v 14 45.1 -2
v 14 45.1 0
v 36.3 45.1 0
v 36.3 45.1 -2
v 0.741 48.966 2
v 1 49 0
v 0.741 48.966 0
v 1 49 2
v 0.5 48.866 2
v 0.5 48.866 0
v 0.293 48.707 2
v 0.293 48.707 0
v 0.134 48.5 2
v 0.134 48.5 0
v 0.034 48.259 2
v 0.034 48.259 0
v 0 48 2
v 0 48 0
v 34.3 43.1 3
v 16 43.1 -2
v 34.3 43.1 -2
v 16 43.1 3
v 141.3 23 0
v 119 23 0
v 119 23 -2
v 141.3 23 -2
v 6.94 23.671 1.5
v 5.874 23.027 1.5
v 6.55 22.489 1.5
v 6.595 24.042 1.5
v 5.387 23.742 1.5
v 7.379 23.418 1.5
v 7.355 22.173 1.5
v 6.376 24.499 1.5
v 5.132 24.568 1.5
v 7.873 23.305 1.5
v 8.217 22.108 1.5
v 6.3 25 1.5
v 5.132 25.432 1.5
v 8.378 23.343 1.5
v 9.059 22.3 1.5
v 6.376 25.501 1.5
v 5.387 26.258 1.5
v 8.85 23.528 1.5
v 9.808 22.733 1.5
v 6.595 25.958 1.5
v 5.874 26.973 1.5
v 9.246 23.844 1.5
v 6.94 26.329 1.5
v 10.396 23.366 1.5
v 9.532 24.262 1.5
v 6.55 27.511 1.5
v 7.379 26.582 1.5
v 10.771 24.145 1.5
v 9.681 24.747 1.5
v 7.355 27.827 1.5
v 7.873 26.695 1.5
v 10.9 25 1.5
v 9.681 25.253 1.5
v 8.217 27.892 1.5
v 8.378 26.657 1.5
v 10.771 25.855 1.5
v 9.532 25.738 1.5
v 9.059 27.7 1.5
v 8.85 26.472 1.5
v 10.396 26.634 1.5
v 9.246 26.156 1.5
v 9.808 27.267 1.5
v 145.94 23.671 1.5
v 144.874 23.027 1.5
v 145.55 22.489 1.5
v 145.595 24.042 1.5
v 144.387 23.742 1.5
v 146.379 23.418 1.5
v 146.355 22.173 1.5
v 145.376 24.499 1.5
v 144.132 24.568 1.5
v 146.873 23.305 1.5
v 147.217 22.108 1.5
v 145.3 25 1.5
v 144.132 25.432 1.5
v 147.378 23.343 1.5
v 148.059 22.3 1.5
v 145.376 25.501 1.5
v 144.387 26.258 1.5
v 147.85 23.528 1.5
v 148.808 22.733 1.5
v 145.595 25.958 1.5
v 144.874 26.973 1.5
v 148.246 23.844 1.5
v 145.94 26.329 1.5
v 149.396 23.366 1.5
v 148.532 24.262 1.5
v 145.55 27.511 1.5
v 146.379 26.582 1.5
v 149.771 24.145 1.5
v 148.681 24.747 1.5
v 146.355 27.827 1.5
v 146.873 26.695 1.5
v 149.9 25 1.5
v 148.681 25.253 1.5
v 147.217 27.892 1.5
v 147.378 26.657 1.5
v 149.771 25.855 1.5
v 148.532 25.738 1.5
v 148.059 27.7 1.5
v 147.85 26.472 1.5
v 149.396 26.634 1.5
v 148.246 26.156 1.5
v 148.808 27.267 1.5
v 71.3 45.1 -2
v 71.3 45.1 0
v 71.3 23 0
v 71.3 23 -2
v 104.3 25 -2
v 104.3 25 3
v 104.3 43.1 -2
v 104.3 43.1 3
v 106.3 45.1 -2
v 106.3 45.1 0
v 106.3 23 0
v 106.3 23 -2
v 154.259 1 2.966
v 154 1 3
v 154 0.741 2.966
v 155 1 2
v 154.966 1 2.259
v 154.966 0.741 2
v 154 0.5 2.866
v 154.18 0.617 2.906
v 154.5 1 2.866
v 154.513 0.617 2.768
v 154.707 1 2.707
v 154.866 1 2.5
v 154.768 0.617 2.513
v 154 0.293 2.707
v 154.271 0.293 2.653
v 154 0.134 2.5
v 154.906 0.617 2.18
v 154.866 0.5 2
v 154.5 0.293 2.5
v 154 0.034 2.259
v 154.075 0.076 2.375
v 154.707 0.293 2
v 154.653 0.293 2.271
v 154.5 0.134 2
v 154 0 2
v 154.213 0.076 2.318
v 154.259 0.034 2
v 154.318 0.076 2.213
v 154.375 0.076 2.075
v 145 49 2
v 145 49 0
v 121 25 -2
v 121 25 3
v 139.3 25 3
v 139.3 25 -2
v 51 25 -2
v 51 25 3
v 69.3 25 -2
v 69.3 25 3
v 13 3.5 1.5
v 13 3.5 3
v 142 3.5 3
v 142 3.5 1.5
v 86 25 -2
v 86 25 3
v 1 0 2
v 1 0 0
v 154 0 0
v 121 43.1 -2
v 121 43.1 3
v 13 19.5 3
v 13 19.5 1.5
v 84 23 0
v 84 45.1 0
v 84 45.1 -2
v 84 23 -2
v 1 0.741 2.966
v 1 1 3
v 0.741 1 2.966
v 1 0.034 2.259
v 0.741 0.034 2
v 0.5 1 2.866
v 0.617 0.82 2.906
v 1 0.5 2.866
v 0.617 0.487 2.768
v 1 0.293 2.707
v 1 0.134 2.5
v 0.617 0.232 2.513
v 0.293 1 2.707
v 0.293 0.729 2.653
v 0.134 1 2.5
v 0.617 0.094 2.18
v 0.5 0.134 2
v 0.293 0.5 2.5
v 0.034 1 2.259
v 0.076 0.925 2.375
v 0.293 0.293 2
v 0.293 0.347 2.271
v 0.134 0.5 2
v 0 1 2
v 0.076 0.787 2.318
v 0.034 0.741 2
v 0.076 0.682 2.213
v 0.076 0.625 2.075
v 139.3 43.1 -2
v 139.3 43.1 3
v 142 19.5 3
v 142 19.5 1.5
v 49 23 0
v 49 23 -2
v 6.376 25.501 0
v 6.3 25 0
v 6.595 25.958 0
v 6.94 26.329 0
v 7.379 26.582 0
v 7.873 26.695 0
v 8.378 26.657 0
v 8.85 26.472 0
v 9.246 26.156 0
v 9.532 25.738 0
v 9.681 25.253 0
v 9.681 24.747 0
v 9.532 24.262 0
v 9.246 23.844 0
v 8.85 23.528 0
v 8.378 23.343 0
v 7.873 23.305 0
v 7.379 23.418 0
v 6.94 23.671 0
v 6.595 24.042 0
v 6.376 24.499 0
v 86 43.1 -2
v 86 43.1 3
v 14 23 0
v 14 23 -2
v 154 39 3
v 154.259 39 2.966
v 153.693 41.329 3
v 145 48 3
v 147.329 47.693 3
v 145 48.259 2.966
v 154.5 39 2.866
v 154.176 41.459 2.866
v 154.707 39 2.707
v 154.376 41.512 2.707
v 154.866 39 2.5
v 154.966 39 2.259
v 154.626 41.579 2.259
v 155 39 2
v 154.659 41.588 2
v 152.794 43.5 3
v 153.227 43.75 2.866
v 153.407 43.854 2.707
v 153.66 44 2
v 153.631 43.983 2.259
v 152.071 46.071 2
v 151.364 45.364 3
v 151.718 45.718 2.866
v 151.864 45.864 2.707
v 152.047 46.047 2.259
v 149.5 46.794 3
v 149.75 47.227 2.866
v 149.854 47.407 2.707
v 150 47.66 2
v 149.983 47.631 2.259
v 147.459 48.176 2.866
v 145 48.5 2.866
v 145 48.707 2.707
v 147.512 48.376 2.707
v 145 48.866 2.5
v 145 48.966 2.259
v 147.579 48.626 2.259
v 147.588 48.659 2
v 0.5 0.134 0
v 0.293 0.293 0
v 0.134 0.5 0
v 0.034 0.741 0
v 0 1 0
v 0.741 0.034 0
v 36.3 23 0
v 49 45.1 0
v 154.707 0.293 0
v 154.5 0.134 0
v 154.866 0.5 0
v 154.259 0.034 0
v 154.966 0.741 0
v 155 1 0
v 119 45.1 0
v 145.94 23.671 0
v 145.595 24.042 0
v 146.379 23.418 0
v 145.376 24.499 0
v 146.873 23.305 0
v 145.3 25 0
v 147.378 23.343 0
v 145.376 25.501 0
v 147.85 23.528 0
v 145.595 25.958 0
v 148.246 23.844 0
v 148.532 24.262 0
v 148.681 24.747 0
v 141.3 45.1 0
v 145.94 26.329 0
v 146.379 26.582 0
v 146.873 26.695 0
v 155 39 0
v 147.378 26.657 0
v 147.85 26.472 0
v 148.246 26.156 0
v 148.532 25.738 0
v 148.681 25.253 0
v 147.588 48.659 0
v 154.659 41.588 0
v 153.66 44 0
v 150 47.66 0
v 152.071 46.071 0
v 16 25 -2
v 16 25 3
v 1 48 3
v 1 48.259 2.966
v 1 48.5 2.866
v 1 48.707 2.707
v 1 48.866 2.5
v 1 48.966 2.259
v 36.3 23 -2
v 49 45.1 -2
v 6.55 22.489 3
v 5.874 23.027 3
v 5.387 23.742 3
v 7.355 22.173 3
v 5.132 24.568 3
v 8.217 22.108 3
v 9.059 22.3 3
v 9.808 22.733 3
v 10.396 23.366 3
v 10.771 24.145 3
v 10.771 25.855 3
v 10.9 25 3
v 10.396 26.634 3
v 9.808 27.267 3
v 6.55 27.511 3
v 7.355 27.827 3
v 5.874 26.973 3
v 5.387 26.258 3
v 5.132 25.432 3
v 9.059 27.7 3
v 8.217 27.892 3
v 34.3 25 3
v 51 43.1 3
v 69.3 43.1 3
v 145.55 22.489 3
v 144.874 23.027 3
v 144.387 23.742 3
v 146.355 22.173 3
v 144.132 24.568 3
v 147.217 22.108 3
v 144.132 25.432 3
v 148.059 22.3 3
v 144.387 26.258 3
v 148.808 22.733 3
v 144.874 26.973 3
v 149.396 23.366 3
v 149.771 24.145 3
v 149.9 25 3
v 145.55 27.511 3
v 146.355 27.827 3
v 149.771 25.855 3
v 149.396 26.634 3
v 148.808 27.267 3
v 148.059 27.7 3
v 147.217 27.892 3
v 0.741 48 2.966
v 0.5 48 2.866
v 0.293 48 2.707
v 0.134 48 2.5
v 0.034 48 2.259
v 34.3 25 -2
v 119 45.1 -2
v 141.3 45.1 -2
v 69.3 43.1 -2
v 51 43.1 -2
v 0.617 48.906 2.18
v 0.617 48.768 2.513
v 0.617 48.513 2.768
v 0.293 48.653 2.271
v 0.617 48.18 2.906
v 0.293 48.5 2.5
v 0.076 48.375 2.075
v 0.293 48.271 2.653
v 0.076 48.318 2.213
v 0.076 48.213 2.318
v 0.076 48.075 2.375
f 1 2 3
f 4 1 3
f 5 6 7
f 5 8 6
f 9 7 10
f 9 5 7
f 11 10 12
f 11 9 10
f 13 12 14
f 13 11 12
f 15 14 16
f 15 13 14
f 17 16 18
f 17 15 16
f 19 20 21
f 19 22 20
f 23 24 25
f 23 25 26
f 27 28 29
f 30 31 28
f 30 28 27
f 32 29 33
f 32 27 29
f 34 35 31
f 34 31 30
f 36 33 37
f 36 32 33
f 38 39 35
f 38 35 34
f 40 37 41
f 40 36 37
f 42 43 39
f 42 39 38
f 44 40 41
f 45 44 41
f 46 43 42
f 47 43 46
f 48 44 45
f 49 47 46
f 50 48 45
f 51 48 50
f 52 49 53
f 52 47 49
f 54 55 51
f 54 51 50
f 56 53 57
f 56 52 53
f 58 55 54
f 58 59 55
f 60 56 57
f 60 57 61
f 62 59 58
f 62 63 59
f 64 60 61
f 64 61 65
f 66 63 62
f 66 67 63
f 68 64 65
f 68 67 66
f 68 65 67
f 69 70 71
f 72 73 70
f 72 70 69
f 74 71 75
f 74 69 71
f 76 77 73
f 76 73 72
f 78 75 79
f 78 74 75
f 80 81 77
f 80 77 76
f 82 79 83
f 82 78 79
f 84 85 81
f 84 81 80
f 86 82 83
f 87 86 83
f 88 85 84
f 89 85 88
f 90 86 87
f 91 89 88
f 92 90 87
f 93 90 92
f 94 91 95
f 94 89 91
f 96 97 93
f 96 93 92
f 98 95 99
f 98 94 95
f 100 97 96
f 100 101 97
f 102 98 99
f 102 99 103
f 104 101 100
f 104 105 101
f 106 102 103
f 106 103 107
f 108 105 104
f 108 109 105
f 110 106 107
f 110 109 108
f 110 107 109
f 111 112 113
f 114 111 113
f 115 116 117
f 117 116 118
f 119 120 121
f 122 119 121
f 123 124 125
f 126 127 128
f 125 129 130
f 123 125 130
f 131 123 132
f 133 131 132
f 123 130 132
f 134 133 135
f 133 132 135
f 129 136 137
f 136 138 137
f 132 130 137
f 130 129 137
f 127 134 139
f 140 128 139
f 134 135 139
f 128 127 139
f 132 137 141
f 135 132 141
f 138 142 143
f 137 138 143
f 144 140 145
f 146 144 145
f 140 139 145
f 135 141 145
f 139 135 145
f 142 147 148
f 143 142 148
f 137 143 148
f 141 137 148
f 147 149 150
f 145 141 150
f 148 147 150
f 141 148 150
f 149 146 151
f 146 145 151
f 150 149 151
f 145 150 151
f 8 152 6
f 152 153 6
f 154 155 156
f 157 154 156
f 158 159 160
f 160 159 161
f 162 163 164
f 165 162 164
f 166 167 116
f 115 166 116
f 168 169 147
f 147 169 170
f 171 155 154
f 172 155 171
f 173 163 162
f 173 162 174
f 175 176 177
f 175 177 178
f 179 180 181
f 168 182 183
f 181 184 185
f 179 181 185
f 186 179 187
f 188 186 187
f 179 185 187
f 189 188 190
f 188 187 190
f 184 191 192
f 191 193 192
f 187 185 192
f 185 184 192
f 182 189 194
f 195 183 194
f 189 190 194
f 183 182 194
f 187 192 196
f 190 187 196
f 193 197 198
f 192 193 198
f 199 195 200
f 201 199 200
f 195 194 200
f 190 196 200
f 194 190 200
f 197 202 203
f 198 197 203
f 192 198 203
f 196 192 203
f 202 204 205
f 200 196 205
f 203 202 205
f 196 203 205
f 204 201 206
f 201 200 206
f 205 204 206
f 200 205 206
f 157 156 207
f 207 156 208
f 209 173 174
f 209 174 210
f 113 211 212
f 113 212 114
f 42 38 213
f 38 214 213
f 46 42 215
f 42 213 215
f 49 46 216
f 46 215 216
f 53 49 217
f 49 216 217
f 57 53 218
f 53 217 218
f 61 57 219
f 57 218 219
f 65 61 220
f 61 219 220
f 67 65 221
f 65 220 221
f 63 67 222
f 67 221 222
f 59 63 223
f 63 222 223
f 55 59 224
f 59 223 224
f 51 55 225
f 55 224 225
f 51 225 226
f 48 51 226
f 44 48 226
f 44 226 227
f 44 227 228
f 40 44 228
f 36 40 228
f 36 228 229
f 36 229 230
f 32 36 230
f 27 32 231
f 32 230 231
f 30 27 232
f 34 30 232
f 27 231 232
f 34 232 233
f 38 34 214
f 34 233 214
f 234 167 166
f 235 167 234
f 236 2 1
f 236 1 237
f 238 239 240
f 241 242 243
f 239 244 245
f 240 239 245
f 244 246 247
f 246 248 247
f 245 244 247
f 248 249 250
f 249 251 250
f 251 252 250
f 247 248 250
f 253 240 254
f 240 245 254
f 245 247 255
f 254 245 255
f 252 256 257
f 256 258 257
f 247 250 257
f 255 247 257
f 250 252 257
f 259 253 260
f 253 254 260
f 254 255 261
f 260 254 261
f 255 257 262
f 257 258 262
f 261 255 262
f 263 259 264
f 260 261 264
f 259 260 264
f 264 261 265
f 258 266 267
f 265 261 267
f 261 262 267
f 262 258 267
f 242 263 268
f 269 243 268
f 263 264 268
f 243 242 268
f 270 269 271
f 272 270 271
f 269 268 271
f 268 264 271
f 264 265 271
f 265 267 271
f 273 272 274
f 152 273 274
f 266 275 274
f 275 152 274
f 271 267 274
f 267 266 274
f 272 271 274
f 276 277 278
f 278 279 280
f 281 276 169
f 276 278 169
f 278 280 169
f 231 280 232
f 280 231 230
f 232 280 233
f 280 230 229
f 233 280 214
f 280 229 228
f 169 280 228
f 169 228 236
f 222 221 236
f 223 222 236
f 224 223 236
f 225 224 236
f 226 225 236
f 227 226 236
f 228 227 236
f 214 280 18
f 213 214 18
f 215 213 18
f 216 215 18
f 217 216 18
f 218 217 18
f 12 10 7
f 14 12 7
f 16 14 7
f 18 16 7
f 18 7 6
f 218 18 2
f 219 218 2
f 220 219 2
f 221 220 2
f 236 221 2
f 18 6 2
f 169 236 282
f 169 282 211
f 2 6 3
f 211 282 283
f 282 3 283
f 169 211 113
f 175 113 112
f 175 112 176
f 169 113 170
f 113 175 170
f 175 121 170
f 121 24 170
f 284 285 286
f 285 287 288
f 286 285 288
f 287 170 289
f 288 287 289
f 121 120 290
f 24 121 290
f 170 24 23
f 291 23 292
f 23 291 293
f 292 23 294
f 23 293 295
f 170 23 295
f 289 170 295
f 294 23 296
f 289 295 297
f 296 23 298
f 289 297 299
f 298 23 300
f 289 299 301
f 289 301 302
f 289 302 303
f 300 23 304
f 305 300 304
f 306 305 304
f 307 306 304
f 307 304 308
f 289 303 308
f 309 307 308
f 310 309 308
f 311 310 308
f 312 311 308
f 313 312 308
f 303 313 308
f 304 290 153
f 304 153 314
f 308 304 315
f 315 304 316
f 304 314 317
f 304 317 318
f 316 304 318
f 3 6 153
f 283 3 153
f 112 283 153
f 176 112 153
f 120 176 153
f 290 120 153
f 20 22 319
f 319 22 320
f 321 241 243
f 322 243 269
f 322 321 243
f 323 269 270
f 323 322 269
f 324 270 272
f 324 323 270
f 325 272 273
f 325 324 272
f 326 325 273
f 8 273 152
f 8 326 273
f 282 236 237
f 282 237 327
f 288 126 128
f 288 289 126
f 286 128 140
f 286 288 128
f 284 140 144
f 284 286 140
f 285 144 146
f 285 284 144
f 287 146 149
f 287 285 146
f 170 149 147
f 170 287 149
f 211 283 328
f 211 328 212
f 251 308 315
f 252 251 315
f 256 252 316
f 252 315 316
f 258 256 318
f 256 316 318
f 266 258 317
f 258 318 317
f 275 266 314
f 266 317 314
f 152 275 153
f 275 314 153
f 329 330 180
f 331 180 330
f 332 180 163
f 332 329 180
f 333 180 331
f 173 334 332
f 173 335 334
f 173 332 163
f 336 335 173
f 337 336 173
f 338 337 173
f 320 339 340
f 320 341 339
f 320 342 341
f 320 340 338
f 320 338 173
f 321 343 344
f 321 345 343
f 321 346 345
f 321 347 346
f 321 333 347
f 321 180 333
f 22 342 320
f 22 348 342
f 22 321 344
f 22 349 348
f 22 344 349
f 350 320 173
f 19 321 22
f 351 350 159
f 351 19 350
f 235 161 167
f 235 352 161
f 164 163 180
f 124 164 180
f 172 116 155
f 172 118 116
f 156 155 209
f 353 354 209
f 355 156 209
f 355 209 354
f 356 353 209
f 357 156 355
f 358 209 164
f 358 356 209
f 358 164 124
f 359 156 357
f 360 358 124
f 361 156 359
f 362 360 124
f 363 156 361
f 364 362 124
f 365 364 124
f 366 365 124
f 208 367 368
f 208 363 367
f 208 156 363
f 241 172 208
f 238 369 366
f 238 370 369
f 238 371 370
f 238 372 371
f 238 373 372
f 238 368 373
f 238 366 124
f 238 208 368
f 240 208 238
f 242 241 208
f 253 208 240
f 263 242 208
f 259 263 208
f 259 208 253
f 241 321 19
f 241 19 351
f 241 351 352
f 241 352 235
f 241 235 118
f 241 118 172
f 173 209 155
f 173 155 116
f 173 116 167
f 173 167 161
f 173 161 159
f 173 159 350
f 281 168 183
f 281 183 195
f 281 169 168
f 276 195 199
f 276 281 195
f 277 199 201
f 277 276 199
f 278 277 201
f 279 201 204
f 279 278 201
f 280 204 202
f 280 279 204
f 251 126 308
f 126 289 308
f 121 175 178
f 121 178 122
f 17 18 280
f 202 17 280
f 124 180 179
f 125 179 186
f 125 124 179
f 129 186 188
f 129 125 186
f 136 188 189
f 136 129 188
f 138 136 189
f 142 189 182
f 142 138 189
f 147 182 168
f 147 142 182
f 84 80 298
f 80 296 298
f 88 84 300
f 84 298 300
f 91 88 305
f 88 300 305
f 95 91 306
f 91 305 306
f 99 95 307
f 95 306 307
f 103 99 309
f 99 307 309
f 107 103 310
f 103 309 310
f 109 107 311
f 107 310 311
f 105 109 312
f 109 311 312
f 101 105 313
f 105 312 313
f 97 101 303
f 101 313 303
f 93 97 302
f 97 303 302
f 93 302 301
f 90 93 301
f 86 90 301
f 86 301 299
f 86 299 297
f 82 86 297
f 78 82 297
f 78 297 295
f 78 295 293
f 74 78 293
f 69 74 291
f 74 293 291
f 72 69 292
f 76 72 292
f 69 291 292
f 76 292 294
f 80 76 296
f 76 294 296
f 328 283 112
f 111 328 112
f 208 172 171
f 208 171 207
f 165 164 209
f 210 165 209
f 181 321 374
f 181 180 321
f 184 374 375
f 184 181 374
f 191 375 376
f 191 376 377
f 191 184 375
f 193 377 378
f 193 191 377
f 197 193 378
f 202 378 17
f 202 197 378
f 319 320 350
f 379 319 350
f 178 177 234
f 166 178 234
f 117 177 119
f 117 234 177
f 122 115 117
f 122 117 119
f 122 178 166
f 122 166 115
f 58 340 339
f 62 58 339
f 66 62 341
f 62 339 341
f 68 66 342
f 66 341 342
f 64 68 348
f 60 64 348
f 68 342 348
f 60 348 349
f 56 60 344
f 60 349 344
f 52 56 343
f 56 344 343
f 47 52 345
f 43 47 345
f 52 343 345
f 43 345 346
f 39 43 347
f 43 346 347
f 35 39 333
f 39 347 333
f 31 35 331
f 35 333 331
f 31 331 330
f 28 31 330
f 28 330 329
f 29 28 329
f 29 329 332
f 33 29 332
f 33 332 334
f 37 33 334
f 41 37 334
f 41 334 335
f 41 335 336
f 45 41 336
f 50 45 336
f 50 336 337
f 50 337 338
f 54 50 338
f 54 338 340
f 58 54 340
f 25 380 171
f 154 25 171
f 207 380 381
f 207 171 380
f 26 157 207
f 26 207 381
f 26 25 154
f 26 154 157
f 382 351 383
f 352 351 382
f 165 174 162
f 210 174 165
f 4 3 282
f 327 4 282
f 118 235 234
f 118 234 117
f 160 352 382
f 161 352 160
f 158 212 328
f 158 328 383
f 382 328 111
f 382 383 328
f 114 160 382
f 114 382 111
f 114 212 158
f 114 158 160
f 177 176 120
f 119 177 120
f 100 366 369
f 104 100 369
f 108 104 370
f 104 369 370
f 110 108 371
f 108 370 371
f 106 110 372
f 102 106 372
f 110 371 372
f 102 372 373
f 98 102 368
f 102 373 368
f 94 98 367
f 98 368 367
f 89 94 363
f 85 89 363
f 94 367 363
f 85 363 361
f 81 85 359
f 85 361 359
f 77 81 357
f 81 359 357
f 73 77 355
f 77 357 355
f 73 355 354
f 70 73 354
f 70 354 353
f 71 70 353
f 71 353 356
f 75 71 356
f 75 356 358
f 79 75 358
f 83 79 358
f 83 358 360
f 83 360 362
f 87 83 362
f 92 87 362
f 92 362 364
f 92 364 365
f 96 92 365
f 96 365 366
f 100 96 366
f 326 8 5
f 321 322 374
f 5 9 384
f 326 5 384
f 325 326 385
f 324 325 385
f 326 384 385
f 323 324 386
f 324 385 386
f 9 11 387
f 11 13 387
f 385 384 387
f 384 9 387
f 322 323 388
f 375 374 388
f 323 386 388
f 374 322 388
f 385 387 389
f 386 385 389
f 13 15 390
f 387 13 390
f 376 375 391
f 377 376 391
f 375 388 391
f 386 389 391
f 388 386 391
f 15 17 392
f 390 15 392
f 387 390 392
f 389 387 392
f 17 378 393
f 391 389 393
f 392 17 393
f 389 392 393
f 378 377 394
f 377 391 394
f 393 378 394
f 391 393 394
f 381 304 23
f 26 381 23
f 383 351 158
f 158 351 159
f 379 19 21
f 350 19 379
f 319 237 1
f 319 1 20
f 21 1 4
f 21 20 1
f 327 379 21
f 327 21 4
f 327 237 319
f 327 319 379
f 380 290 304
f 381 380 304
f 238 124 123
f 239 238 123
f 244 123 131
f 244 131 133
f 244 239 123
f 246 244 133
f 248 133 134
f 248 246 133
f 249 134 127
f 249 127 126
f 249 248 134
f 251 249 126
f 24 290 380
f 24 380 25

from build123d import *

# Parameters (mm, degrees)
PAD_DEPTH              = 3
SKETCH001_W            = 18.3
SKETCH001_H            = 18.1
POCKET_DEPTH           = 3.001
LINEARPATTERN_COUNT    = 4
LINEARPATTERN_PITCH    = 35
SKETCH002_W            = 129
SKETCH002_H            = 16
POCKET001_DEPTH        = 1.5
HOLE_D                 = 3.4
HOLE_CBORE_D           = 5.8
HOLE_CBORE_DEPTH       = 1.5
SKETCH004_W            = 22.3
SKETCH004_H            = 22.1
SKETCH004_W_2          = 18.3
SKETCH004_H_2          = 18.1
PAD001_DEPTH           = 2
LINEARPATTERN001_COUNT = 4
LINEARPATTERN001_PITCH = 35
FILLET_R               = 1
FILLET001_R            = 1
FILLET002_R            = 1


with BuildPart() as part:
    # Sketch → Pad (new body)
    with BuildSketch(Plane.XY):
        with BuildLine():
            Line((145, 49), (0, 49))
            Line((0, 49), (0, 0))
            Line((0, 0), (155, 0))
            Line((155, 0), (155, 39))
            ThreePointArc((155, 39), (152.071068, 46.071068), (145, 49))
        make_face()
    extrude(amount=PAD_DEPTH)

    # Sketch001 (on Face7 of Pad) → Pocket (cut, through all)
    with BuildSketch(Plane.XY.offset(3)):
        with Locations((25.15, 34.05)):
            Rectangle(SKETCH001_W, SKETCH001_H)
    pocket = extrude(amount=-POCKET_DEPTH, mode=Mode.SUBTRACT)

    # LinearPattern: Pocket ×4
    with Locations(*[(i * LINEARPATTERN_PITCH, 0, 0) for i in range(1, LINEARPATTERN_COUNT)]):
        add(pocket, mode=Mode.SUBTRACT)

    # Sketch002 (on Face5 of LinearPattern) → Pocket001 (cut)
    with BuildSketch(Plane.XY.offset(3)):
        with Locations((77.5, 11.5)):
            Rectangle(SKETCH002_W, SKETCH002_H)
    extrude(amount=-POCKET001_DEPTH, mode=Mode.SUBTRACT)

    # Hole (through all)
    with Locations(Plane.XY.offset(3)):
        with Locations((8, 25), (147, 25)):
            CounterBoreHole(HOLE_D / 2, HOLE_CBORE_D / 2, HOLE_CBORE_DEPTH)

    # Sketch004 (on Face4 of Hole) → Pad001 (join)
    with BuildSketch(Plane(origin=(0, 0, 0), x_dir=(1, 0, 0), z_dir=(0, 0, -1))):
        with Locations((25.15, -34.05)):
            Rectangle(SKETCH004_W, SKETCH004_H)
        with Locations((25.15, -34.05)):
            Rectangle(SKETCH004_W_2, SKETCH004_H_2, mode=Mode.SUBTRACT)
    pad001 = extrude(amount=PAD001_DEPTH)

    # LinearPattern001: Pad001 ×4
    with Locations(*[(i * LINEARPATTERN001_PITCH, 0, 0) for i in range(1, LINEARPATTERN001_COUNT)]):
        add(pad001)

    # Fillet
    fillet_edges = [part.edges().sort_by_distance(p)[0] for p in [
        (72.5, 49, 3),
    ]]
    fillet(fillet_edges, radius=FILLET_R)

    # Fillet001
    fillet001_edges = [part.edges().sort_by_distance(p)[0] for p in [
        (77, 0, 3),
    ]]
    fillet(fillet001_edges, radius=FILLET001_R)

    # Fillet002
    fillet002_edges = [part.edges().sort_by_distance(p)[0] for p in [
        (0, 24.5, 3),
    ]]
    fillet(fillet002_edges, radius=FILLET002_R)


solid = part.part
